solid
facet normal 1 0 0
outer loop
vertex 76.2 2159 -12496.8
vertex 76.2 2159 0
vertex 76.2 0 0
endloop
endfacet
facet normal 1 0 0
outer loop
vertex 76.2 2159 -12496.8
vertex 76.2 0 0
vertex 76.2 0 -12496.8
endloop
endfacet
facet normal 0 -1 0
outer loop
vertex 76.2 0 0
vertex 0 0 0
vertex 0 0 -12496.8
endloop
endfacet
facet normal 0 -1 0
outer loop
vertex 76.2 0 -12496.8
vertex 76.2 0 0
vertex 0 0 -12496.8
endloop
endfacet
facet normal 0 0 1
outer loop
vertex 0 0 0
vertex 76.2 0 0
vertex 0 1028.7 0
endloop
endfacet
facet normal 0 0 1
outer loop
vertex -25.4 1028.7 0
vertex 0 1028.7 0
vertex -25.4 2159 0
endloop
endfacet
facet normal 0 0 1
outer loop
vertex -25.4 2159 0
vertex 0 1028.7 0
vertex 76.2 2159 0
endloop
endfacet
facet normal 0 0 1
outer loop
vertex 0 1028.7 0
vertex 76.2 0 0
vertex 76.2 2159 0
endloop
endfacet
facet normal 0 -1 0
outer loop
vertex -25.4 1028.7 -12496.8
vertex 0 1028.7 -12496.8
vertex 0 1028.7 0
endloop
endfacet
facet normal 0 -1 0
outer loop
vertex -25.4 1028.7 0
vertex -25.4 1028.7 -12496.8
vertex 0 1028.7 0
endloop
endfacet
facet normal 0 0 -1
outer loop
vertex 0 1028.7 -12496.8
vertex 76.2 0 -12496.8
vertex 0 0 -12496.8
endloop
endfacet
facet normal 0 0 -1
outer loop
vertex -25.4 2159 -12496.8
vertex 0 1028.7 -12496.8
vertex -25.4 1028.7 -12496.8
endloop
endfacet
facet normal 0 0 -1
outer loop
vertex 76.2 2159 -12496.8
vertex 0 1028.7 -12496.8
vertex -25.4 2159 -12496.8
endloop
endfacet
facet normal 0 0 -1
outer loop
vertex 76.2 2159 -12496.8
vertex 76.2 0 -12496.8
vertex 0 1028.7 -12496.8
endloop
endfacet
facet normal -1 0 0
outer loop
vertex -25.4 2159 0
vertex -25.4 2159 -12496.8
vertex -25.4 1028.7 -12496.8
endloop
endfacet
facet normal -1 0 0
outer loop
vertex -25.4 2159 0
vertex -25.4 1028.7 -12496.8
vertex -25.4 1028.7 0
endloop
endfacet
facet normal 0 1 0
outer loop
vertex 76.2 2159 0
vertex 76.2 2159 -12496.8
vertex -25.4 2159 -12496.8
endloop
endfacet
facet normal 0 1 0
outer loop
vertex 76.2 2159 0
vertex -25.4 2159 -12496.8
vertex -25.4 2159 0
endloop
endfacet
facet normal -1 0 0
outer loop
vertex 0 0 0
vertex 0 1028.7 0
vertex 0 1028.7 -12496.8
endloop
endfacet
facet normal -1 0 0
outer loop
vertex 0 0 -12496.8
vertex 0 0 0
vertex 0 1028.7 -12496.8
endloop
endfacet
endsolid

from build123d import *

# Parameters (mm, degrees)
SKETCH1_W           = 12496.8
SKETCH1_H           = 2159
BOSS_EXTRUDE1_DEPTH = 76.2
SKETCH2_W           = 12496.8
SKETCH2_H           = 1130.3
BOSS_EXTRUDE2_DEPTH = 25.4


with BuildPart() as part:
    # Sketch1 → Boss-Extrude1 (new body)
    with BuildSketch(Plane(origin=(0, 0, 0), x_dir=(0, 0, -1), z_dir=(1, 0, 0))):
        with Locations((6248.4, 1079.5)):
            Rectangle(SKETCH1_W, SKETCH1_H)
    extrude(amount=BOSS_EXTRUDE1_DEPTH)

    # Sketch2 → Boss-Extrude2 (add)
    with BuildSketch(Plane.ZY):
        with Locations((-6248.4, 1593.85)):
            Rectangle(SKETCH2_W, SKETCH2_H)
    extrude(amount=BOSS_EXTRUDE2_DEPTH)


solid = part.part
